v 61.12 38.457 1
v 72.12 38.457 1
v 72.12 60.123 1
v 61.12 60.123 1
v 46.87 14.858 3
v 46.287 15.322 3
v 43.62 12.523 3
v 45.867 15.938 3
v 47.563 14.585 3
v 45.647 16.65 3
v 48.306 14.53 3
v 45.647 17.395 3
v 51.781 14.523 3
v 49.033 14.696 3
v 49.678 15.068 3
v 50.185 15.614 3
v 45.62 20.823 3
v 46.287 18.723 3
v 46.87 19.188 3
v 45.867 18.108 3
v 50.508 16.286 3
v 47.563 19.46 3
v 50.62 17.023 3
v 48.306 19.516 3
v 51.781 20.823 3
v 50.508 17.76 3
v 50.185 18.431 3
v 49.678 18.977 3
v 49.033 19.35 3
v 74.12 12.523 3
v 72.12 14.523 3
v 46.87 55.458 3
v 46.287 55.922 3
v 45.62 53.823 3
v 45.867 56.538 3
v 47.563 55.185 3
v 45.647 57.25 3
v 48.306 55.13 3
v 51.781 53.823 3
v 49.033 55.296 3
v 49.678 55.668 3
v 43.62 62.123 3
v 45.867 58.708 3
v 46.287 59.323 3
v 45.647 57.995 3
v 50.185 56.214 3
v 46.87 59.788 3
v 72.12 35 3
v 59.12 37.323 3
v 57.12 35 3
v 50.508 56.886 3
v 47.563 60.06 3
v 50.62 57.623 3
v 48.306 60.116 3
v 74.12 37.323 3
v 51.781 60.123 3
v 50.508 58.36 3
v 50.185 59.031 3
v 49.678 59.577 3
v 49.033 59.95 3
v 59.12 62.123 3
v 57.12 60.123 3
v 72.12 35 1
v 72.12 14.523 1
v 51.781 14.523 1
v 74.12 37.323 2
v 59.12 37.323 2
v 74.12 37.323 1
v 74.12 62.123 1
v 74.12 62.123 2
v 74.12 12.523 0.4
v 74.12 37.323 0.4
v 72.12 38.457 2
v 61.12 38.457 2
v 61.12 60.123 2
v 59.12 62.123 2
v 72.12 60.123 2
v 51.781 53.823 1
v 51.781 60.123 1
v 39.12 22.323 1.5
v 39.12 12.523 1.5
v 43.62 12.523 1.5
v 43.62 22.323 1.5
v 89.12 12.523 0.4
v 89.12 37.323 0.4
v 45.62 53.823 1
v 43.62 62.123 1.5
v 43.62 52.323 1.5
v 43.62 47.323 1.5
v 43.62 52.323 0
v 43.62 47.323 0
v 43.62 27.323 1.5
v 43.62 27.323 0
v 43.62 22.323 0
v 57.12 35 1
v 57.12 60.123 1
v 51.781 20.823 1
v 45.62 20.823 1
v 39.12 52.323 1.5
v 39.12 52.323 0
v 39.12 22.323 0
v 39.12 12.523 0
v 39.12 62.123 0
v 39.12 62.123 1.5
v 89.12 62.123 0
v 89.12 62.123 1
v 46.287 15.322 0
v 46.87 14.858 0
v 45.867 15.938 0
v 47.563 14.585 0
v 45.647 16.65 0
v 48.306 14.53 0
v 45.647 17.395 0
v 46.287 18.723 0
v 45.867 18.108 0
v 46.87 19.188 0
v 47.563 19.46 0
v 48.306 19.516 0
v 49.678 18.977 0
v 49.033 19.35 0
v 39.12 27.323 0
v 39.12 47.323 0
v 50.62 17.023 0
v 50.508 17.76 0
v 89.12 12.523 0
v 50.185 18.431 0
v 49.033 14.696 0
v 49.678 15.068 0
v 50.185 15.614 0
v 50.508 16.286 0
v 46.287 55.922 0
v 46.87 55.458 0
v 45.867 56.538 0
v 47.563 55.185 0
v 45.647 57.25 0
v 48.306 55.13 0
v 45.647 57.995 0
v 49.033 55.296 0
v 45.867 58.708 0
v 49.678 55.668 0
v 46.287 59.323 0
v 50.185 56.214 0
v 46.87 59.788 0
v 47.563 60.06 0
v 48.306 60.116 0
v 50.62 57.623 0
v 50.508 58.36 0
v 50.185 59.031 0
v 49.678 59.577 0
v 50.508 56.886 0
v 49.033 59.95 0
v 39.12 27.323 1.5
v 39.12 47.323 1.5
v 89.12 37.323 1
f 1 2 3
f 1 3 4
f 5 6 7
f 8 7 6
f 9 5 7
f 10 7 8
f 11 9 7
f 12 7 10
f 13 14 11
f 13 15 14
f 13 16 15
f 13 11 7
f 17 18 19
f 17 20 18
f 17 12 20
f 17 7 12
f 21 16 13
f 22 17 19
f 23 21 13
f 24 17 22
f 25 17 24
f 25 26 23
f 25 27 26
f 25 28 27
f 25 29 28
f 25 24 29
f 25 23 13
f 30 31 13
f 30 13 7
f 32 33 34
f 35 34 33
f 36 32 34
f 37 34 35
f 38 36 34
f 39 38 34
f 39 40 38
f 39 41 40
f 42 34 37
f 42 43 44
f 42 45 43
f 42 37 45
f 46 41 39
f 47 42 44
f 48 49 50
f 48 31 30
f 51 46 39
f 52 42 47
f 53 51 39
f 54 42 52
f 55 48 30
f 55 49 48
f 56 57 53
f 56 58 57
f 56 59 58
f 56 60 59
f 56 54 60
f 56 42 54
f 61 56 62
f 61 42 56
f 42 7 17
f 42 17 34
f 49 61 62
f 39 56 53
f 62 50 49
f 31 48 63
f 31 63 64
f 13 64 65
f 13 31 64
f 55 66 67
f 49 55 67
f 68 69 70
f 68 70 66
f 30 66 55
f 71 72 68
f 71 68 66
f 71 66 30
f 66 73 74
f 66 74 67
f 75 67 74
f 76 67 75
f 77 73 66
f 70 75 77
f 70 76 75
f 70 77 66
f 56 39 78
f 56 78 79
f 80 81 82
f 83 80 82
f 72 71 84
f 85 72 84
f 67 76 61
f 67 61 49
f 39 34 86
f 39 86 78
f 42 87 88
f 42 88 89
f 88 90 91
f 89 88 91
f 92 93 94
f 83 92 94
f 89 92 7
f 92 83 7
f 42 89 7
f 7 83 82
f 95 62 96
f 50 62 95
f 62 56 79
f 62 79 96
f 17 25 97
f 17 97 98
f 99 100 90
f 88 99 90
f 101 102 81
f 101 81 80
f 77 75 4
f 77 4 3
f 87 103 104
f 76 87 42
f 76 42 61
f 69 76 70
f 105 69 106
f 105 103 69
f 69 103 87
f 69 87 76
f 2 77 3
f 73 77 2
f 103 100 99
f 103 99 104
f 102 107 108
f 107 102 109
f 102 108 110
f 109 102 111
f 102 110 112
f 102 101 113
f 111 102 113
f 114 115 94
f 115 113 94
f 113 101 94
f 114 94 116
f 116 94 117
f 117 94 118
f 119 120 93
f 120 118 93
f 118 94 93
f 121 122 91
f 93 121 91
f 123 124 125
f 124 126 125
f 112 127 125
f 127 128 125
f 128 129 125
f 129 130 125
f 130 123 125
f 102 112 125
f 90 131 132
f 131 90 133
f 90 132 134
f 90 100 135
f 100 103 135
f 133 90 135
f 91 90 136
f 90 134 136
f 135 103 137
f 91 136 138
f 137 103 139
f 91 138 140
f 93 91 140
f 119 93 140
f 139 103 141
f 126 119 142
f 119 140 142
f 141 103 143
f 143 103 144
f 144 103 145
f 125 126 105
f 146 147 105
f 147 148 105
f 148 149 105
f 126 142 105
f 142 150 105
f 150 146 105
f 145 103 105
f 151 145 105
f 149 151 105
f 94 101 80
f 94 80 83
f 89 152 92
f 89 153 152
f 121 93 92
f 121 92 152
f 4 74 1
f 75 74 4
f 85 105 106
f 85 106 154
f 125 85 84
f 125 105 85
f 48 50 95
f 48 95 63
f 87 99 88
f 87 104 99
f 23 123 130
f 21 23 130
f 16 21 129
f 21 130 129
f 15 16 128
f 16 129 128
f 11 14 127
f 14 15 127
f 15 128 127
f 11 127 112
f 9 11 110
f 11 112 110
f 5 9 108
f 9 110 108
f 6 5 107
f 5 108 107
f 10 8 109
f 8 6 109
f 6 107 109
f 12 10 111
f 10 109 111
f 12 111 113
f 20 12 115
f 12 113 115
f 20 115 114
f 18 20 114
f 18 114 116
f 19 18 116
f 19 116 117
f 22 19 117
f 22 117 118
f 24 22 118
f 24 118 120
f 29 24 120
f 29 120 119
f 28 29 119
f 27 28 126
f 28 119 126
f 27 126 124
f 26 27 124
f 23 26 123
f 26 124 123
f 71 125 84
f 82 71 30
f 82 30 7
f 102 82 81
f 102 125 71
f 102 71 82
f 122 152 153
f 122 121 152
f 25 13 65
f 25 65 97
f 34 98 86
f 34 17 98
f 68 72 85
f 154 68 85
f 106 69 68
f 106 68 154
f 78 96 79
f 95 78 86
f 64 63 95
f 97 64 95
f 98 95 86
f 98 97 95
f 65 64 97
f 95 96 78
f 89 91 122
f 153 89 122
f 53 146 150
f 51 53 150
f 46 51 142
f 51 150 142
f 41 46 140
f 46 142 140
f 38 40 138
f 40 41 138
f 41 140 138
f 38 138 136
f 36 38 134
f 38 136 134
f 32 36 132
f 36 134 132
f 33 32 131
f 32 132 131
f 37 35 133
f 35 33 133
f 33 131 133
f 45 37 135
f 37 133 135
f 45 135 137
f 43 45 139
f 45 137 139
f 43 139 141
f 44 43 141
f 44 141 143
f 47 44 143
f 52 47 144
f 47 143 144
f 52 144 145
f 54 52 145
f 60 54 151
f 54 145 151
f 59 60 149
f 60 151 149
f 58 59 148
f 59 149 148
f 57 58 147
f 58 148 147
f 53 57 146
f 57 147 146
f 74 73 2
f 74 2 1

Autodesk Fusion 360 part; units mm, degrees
sketch "Schizzo1" plane through (0, 0, 0) normal (0, 0, 1) x (1, 0, 0)
  line L0 (39.1195, 62.1228) -> (89.1195, 62.1228)
  line L1 (89.1195, 62.1228) -> (89.1195, 12.5228)
  line L2 (89.1195, 12.5228) -> (39.1195, 12.5228)
  line L3 (39.1195, 12.5228) -> (39.1195, 62.1228)
  line L4 (43.6195, 62.1228) -> (43.6195, 12.5228)
  line L5 (74.1195, 62.1228) -> (74.1195, 12.5228)
  line L6 (39.1195, 37.3228) -> (89.1195, 37.3228) construction
  line L7 (48.1195, 62.1228) -> (48.1195, 12.5228) construction
  circle A0 centre (48.1195, 57.6228) radius 2.5
  circle A1 centre (48.1195, 17.0228) radius 2.5
  line L8 (74.1195, 37.3228) -> (89.1195, 37.3228)
  line L9 (86.071, 62.1228) -> (86.071, 12.5228) construction
  line L10 (59.1195, 62.1228) -> (59.1195, 37.3228)
  line L11 (74.1195, 37.3228) -> (59.1195, 37.3228)
  line L12 (39.1195, 52.3228) -> (43.6195, 52.3228)
  line L13 (43.6195, 52.3228) -> (43.6195, 47.3228)
  line L14 (43.6195, 47.3228) -> (39.1195, 47.3228)
  line L15 (39.1195, 47.3228) -> (39.1195, 52.3228)
  line L16 (43.6195, 27.3228) -> (39.1195, 27.3228)
  line L17 (39.1195, 22.3228) -> (43.6195, 22.3228)
  line L18 (39.1195, 49.8228) -> (43.6195, 49.8228) construction
  line L19 (39.1195, 24.8228) -> (43.6195, 24.8228) construction
  dimension "d1" = 50
  dimension "d2" = 49.6
  dimension "d3" = 4.5
  dimension "d4" = 15
  dimension "d6" = 5
  dimension "d7" = 40.6
  dimension "d26" = 9
  dimension "d29" = 15
  dimension "d40" = 5
  dimension "d41" = 25
extrude "Estrusione1" add sketch "Schizzo1" along normal blind 3 contours L0 L2 L4 L5 L10 L11 L13
extrude "Estrusione7" add sketch "Schizzo1" along normal blind 2 contours L0 L5 L10 L11
extrude "Estrusione2" add sketch "Schizzo1" along normal blind 0.4 contours L1 L2 L5 L8
extrude "Estrusione6" add sketch "Schizzo1" along normal blind 1 contours L0 L1 L5 L8
extrude "Estrusione3" add sketch "Schizzo1" along normal blind 1.5 contours L0 L3 L4 L12 | L3 L4 L14 L16 | L2 L3 L4 L17
sketch "Schizzo4" plane through (0, 0, 3) normal (0, 0, 1) x (-1, 0, 0)
  circle A0 centre (-48.1195, -57.6228) radius 2.5
  circle A1 centre (-48.1195, -17.0228) radius 2.5
  line L0 (-74.1195, -12.5228) -> (-74.1195, -37.3228)
  line L1 (-74.1195, -37.3228) -> (-59.1195, -37.3228)
  line L2 (-59.1195, -37.3228) -> (-59.1195, -62.1228)
  line L3 (-59.1195, -62.1228) -> (-43.6195, -62.1228)
  line L4 (-43.6195, -62.1228) -> (-43.6195, -12.5228)
  line L5 (-43.6195, -12.5228) -> (-74.1195, -12.5228)
  line L6 (-59.1195, -37.3228) -> (-45.6195, -37.3228) construction
  line L7 (-51.7809, -60.1228) -> (-57.1195, -60.1228)
  line L8 (-57.1195, -60.1228) -> (-57.1195, -35)
  line L9 (-57.1195, -35) -> (-72.1195, -35)
  line L10 (-72.1195, -35) -> (-72.1195, -14.5228)
  line L11 (-72.1195, -14.5228) -> (-51.7809, -14.5228)
  line L12 (-51.7809, -14.5228) -> (-51.7809, -20.8228)
  line L13 (-51.7809, -20.8228) -> (-45.6195, -20.8228)
  line L14 (-45.6195, -20.8228) -> (-45.6195, -53.8228)
  line L15 (-45.6195, -53.8228) -> (-51.7809, -53.8228)
  line L16 (-51.7809, -53.8228) -> (-51.7809, -60.1228)
  point P0 (-45.6195, -37.3228)
  dimension "d47" = 2
  dimension "d48" = 2
  dimension "d49" = 2
  dimension "d50" = 2
  dimension "d51" = 2
  dimension "d52" = 33
sketch "Schizzo5" plane through (0, 0, 2) normal (0, 0, 1) x (-1, 0, 0)
  line L0 (-59.1195, -62.1228) -> (-59.1195, -37.3228)
  line L1 (-59.1195, -37.3228) -> (-74.1195, -37.3228)
  line L2 (-74.1195, -37.3228) -> (-74.1195, -62.1228)
  line L3 (-74.1195, -62.1228) -> (-59.1195, -62.1228)
  line L4 (-61.1195, -60.1228) -> (-72.1195, -60.1228)
  line L5 (-72.1195, -60.1228) -> (-72.1195, -38.4568)
  line L6 (-72.1195, -38.4568) -> (-61.1195, -38.4568)
  line L7 (-61.1195, -38.4568) -> (-61.1195, -60.1228)
  line L8 (-59.1195, -37.3228) -> (-59.1195, -62.1228)
  dimension "d42" = 2
  dimension "d43" = 2
  dimension "d44" = 2
sketch "Schizzo6" plane through (0, 0, 1) normal (0, 0, 1) x (-1, 0, 0)
  line L0 (-74.1195, -62.1228) -> (-74.1195, -37.3228)
  line L1 (-74.1195, -37.3228) -> (-89.1195, -37.3228)
  line L2 (-89.1195, -37.3228) -> (-89.1195, -62.1228)
  line L3 (-89.1195, -62.1228) -> (-74.1195, -62.1228)
extrude "Estrusione10" cut sketch "Schizzo5" against normal blind 1 contours L4 L5 L6 L7
extrude "Estrusione11" cut sketch "Schizzo4" against normal blind 2 contours L7 L8 L9 L10 L11 L12 L13 L14 L15 L16
extrude "Estrusione9" [suppressed]
extrude "Estrusione8" [suppressed]
equation "d2 = 50 mm - 0.4 mm"
equation "d7 = d2 - 9 mm"
